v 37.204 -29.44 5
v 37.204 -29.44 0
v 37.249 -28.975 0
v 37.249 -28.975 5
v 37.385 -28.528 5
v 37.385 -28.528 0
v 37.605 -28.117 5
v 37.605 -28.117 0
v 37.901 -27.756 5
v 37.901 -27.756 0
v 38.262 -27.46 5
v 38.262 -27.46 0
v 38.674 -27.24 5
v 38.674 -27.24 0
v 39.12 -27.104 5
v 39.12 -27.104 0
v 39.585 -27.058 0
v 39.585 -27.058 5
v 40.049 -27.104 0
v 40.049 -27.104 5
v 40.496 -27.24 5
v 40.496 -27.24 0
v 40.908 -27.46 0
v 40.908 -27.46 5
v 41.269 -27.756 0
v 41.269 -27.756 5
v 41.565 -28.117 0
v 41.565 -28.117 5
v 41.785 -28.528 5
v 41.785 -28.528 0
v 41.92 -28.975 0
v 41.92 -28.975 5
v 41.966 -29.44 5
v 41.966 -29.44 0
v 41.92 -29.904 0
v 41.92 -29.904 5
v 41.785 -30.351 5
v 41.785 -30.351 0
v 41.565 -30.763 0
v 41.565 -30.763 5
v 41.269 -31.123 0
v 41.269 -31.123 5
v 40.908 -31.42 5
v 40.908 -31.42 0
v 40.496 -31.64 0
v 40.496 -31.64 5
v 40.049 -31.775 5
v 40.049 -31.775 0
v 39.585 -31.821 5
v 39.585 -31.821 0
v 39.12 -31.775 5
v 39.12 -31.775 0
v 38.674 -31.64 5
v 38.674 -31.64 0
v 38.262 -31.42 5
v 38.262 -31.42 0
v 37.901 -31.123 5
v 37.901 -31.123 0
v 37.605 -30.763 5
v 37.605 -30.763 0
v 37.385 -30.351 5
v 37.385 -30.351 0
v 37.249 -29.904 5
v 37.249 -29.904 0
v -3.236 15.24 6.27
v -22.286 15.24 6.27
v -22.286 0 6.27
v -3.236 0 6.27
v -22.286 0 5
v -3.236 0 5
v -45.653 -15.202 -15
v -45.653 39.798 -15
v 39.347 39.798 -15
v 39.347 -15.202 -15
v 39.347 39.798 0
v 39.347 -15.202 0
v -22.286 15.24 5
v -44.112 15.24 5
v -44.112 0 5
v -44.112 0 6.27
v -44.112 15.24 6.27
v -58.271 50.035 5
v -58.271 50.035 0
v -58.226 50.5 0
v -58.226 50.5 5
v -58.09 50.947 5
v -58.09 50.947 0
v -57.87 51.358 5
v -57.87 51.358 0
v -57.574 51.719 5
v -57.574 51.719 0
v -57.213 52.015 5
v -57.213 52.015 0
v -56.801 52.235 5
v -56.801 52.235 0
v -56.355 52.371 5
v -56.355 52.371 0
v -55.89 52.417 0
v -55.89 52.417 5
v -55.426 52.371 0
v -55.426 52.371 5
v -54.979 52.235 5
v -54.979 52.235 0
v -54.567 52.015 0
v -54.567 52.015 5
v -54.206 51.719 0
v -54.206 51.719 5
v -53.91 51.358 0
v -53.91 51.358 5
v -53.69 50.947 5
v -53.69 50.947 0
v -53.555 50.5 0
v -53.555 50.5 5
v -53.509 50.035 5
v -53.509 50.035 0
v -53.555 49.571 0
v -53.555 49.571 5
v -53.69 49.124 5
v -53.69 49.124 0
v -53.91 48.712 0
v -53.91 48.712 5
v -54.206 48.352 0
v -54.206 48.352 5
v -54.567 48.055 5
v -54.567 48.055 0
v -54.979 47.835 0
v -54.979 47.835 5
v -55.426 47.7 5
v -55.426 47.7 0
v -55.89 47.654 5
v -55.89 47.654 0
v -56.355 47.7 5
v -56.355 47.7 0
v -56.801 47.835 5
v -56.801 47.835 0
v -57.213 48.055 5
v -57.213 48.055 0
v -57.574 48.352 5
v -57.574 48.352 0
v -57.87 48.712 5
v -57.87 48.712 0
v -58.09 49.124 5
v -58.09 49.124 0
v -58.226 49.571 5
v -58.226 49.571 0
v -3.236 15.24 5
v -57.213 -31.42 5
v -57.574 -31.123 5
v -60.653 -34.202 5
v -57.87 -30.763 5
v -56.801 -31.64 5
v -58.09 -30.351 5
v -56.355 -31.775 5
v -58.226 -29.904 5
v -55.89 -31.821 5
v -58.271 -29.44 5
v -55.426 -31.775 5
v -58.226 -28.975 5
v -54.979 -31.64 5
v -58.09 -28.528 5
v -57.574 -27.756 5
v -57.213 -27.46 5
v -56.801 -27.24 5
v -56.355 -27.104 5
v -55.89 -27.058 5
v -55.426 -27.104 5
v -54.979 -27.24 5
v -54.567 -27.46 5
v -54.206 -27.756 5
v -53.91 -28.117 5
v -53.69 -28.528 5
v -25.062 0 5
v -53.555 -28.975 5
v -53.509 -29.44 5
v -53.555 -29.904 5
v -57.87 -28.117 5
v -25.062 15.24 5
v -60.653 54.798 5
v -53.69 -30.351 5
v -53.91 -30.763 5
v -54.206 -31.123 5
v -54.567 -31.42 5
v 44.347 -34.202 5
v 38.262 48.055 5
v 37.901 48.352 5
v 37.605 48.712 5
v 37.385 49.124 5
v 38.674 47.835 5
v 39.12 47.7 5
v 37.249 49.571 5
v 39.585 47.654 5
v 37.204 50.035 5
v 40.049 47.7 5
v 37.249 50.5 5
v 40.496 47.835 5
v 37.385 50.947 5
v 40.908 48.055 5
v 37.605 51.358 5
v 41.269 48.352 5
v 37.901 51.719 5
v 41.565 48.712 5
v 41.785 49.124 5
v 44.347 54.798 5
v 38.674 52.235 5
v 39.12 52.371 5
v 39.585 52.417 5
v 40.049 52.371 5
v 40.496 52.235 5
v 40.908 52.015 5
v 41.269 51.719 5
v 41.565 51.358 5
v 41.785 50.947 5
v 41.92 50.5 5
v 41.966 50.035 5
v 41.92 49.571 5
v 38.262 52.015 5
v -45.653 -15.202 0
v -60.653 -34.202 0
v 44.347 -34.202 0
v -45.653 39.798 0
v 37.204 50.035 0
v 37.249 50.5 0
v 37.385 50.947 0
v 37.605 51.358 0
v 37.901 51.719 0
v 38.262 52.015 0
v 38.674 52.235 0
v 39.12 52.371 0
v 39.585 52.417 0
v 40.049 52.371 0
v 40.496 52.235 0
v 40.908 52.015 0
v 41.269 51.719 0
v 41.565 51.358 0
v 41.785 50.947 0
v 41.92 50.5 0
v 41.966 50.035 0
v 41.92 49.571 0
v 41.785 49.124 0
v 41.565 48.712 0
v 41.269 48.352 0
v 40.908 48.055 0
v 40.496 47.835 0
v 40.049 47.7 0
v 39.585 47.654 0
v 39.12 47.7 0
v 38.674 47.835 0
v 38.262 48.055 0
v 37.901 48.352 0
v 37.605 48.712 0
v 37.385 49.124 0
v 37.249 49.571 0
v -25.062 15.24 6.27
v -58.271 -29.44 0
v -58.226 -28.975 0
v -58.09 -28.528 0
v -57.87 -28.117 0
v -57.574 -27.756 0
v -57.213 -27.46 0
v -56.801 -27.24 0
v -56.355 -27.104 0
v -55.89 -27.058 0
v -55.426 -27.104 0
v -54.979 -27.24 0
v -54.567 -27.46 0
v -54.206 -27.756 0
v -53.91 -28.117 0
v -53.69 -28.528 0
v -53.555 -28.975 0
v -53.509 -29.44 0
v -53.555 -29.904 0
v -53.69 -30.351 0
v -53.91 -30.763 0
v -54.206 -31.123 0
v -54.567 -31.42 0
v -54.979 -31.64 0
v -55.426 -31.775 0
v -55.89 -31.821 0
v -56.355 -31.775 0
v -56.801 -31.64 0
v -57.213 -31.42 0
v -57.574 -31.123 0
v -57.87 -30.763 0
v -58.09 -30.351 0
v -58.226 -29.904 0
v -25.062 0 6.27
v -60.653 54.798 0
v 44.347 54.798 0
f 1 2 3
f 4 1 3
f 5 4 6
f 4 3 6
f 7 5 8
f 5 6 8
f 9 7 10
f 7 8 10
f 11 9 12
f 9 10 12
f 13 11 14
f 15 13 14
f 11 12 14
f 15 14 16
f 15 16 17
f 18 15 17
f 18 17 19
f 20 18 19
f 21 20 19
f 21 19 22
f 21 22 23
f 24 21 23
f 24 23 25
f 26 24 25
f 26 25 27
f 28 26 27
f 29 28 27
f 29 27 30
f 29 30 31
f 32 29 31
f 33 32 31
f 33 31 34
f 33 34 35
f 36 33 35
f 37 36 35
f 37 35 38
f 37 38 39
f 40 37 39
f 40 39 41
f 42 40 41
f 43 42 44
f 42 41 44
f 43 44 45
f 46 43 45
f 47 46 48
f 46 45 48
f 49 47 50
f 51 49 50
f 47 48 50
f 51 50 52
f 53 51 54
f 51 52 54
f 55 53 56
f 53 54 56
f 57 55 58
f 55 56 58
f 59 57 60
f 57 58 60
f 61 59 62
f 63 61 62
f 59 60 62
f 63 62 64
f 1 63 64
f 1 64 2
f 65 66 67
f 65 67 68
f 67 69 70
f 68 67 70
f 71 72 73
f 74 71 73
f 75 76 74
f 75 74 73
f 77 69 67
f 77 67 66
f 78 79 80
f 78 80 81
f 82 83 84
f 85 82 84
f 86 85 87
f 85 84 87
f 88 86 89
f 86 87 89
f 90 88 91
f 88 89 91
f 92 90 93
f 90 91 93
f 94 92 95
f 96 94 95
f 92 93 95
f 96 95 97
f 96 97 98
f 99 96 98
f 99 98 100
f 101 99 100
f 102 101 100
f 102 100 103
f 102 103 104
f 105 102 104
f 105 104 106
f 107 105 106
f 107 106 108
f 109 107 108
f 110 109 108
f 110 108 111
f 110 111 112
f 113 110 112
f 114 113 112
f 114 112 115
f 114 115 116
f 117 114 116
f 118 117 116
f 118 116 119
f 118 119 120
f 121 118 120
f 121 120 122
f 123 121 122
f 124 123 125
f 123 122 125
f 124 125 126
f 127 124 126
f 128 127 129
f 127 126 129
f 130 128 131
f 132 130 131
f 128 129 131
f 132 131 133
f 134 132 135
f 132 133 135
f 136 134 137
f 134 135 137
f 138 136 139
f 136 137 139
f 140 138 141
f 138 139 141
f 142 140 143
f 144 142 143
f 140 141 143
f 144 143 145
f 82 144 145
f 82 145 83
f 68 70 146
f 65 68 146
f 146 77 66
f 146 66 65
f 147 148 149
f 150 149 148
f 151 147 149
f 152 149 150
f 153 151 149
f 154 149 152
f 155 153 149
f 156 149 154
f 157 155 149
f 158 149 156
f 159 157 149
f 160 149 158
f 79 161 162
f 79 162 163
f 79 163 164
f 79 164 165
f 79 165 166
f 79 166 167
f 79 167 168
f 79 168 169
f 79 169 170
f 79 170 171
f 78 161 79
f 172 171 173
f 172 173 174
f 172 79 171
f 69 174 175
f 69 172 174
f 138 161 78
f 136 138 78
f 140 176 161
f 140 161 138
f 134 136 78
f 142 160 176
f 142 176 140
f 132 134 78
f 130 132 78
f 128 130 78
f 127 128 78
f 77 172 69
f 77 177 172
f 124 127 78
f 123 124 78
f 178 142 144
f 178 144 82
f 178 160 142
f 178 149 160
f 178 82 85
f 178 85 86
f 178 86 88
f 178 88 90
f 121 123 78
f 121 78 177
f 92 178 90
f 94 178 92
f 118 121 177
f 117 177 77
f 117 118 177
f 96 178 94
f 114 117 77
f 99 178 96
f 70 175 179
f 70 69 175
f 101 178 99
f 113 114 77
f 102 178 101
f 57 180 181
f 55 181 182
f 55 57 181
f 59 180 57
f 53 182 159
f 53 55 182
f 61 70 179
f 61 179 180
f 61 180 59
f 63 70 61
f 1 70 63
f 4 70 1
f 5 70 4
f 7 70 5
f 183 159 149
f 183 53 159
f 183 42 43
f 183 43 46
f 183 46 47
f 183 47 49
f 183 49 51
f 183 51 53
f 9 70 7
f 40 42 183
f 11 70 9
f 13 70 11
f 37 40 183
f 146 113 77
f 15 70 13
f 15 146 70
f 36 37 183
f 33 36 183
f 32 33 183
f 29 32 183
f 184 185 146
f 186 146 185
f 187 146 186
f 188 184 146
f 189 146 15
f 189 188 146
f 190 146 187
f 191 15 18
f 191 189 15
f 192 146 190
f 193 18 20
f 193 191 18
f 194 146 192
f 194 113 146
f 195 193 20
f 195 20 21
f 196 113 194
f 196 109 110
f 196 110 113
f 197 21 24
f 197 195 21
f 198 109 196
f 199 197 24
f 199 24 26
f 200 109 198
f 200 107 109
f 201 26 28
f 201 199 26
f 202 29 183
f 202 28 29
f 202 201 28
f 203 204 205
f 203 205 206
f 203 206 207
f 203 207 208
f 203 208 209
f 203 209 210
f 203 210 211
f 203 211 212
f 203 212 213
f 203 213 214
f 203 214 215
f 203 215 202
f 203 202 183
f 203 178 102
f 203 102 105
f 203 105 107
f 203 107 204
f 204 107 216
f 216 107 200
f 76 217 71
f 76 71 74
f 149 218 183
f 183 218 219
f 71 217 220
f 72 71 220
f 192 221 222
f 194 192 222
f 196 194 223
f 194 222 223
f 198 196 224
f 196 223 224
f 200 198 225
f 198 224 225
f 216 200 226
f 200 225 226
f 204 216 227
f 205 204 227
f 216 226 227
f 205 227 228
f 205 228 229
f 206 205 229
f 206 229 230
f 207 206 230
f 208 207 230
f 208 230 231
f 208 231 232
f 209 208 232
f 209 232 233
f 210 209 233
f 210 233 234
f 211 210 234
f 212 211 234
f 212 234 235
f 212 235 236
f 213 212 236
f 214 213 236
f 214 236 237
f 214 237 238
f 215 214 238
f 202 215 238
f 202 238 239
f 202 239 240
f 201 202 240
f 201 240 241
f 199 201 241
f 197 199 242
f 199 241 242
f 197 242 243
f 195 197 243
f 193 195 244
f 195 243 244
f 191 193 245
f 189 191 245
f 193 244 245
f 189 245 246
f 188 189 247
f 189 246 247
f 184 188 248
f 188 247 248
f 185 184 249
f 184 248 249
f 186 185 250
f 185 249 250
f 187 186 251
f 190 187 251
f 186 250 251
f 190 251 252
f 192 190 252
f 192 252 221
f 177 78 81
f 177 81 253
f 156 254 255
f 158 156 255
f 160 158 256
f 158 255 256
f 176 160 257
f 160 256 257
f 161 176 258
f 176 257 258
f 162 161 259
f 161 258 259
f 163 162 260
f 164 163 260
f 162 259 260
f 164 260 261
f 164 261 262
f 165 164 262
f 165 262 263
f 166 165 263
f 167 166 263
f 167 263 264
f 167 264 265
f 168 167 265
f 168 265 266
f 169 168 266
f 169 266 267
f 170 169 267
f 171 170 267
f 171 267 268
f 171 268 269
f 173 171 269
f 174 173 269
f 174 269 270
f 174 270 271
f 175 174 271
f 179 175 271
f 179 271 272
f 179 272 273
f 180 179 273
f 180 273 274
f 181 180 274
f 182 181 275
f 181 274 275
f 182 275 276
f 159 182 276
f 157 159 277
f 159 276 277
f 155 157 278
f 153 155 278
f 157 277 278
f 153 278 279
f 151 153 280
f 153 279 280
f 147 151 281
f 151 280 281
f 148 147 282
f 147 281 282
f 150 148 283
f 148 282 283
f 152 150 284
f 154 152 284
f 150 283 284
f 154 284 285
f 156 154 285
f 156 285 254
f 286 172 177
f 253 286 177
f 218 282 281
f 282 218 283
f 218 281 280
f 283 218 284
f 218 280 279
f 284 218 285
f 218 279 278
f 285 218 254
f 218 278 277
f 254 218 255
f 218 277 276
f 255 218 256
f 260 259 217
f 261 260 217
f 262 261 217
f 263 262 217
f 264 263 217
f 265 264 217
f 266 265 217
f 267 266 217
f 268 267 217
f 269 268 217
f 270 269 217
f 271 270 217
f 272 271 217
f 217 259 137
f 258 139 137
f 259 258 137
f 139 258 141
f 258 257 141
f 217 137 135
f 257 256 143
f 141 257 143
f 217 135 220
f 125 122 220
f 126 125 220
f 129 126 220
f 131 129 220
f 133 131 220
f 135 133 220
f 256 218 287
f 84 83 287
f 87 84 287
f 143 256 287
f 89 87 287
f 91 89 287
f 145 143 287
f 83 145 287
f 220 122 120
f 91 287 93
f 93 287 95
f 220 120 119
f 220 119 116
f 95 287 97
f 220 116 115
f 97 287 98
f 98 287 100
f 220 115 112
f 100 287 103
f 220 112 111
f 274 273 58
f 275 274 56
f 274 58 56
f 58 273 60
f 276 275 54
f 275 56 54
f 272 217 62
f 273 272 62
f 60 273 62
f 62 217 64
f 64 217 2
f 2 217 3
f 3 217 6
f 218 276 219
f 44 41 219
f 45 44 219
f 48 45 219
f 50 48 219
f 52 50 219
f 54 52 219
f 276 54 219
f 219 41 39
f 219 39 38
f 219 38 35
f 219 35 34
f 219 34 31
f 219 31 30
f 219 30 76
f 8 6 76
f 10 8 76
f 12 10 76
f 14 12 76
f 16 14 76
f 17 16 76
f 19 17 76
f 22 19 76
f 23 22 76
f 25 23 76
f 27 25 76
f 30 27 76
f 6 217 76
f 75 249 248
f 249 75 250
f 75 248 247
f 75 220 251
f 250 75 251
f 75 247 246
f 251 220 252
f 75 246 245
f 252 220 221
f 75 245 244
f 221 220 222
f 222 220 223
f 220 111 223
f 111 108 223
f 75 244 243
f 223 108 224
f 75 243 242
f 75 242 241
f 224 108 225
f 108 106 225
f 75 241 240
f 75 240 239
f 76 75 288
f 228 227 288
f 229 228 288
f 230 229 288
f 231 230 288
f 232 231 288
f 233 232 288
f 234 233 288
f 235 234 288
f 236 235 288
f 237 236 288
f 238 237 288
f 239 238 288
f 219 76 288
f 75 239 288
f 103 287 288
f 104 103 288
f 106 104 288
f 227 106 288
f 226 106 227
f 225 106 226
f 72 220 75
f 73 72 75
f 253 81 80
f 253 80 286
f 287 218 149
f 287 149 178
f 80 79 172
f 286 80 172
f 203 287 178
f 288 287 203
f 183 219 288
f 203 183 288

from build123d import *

# Parameters (mm, degrees)
F0_W     = 105
F0_H     = 89
F2_DEPTH = 5
F1_W     = 85
F1_H     = 55
F3_DEPTH = 15
F4_W     = 19.05
F4_H     = 15.24
F5_DEPTH = 1.27
F7_D     = 4.7625


with BuildPart() as f2:
    # F0 (on Top) → F2 (new body)
    with BuildSketch(Plane.XY):
        with Locations((-8.15268, 10.297881)):
            Rectangle(F0_W, F0_H)
    extrude(amount=F2_DEPTH)

    # F1 (on face) → F3 (join)
    with BuildSketch(Plane.XY):
        with Locations((-3.15268, 12.297881)):
            Rectangle(F1_W, F1_H)
    extrude(amount=-F3_DEPTH)

    # F4 (on face) → F5 (join)
    with BuildSketch(Plane.XY.offset(5)):
        with Locations((-34.587345, 7.62)):
            Rectangle(F4_W, F4_H)
        with Locations((-12.761215, 7.62)):
            Rectangle(F4_W, F4_H)
    extrude(amount=F5_DEPTH)

    # F7 (through all)
    with Locations(Plane.XY.offset(5)):
        with Locations((-55.89018, 50.035381), (-55.89018, -29.439619), (39.58482, 50.035381), (39.58482, -29.439619)):
            Hole(F7_D / 2)


solid = f2.part
